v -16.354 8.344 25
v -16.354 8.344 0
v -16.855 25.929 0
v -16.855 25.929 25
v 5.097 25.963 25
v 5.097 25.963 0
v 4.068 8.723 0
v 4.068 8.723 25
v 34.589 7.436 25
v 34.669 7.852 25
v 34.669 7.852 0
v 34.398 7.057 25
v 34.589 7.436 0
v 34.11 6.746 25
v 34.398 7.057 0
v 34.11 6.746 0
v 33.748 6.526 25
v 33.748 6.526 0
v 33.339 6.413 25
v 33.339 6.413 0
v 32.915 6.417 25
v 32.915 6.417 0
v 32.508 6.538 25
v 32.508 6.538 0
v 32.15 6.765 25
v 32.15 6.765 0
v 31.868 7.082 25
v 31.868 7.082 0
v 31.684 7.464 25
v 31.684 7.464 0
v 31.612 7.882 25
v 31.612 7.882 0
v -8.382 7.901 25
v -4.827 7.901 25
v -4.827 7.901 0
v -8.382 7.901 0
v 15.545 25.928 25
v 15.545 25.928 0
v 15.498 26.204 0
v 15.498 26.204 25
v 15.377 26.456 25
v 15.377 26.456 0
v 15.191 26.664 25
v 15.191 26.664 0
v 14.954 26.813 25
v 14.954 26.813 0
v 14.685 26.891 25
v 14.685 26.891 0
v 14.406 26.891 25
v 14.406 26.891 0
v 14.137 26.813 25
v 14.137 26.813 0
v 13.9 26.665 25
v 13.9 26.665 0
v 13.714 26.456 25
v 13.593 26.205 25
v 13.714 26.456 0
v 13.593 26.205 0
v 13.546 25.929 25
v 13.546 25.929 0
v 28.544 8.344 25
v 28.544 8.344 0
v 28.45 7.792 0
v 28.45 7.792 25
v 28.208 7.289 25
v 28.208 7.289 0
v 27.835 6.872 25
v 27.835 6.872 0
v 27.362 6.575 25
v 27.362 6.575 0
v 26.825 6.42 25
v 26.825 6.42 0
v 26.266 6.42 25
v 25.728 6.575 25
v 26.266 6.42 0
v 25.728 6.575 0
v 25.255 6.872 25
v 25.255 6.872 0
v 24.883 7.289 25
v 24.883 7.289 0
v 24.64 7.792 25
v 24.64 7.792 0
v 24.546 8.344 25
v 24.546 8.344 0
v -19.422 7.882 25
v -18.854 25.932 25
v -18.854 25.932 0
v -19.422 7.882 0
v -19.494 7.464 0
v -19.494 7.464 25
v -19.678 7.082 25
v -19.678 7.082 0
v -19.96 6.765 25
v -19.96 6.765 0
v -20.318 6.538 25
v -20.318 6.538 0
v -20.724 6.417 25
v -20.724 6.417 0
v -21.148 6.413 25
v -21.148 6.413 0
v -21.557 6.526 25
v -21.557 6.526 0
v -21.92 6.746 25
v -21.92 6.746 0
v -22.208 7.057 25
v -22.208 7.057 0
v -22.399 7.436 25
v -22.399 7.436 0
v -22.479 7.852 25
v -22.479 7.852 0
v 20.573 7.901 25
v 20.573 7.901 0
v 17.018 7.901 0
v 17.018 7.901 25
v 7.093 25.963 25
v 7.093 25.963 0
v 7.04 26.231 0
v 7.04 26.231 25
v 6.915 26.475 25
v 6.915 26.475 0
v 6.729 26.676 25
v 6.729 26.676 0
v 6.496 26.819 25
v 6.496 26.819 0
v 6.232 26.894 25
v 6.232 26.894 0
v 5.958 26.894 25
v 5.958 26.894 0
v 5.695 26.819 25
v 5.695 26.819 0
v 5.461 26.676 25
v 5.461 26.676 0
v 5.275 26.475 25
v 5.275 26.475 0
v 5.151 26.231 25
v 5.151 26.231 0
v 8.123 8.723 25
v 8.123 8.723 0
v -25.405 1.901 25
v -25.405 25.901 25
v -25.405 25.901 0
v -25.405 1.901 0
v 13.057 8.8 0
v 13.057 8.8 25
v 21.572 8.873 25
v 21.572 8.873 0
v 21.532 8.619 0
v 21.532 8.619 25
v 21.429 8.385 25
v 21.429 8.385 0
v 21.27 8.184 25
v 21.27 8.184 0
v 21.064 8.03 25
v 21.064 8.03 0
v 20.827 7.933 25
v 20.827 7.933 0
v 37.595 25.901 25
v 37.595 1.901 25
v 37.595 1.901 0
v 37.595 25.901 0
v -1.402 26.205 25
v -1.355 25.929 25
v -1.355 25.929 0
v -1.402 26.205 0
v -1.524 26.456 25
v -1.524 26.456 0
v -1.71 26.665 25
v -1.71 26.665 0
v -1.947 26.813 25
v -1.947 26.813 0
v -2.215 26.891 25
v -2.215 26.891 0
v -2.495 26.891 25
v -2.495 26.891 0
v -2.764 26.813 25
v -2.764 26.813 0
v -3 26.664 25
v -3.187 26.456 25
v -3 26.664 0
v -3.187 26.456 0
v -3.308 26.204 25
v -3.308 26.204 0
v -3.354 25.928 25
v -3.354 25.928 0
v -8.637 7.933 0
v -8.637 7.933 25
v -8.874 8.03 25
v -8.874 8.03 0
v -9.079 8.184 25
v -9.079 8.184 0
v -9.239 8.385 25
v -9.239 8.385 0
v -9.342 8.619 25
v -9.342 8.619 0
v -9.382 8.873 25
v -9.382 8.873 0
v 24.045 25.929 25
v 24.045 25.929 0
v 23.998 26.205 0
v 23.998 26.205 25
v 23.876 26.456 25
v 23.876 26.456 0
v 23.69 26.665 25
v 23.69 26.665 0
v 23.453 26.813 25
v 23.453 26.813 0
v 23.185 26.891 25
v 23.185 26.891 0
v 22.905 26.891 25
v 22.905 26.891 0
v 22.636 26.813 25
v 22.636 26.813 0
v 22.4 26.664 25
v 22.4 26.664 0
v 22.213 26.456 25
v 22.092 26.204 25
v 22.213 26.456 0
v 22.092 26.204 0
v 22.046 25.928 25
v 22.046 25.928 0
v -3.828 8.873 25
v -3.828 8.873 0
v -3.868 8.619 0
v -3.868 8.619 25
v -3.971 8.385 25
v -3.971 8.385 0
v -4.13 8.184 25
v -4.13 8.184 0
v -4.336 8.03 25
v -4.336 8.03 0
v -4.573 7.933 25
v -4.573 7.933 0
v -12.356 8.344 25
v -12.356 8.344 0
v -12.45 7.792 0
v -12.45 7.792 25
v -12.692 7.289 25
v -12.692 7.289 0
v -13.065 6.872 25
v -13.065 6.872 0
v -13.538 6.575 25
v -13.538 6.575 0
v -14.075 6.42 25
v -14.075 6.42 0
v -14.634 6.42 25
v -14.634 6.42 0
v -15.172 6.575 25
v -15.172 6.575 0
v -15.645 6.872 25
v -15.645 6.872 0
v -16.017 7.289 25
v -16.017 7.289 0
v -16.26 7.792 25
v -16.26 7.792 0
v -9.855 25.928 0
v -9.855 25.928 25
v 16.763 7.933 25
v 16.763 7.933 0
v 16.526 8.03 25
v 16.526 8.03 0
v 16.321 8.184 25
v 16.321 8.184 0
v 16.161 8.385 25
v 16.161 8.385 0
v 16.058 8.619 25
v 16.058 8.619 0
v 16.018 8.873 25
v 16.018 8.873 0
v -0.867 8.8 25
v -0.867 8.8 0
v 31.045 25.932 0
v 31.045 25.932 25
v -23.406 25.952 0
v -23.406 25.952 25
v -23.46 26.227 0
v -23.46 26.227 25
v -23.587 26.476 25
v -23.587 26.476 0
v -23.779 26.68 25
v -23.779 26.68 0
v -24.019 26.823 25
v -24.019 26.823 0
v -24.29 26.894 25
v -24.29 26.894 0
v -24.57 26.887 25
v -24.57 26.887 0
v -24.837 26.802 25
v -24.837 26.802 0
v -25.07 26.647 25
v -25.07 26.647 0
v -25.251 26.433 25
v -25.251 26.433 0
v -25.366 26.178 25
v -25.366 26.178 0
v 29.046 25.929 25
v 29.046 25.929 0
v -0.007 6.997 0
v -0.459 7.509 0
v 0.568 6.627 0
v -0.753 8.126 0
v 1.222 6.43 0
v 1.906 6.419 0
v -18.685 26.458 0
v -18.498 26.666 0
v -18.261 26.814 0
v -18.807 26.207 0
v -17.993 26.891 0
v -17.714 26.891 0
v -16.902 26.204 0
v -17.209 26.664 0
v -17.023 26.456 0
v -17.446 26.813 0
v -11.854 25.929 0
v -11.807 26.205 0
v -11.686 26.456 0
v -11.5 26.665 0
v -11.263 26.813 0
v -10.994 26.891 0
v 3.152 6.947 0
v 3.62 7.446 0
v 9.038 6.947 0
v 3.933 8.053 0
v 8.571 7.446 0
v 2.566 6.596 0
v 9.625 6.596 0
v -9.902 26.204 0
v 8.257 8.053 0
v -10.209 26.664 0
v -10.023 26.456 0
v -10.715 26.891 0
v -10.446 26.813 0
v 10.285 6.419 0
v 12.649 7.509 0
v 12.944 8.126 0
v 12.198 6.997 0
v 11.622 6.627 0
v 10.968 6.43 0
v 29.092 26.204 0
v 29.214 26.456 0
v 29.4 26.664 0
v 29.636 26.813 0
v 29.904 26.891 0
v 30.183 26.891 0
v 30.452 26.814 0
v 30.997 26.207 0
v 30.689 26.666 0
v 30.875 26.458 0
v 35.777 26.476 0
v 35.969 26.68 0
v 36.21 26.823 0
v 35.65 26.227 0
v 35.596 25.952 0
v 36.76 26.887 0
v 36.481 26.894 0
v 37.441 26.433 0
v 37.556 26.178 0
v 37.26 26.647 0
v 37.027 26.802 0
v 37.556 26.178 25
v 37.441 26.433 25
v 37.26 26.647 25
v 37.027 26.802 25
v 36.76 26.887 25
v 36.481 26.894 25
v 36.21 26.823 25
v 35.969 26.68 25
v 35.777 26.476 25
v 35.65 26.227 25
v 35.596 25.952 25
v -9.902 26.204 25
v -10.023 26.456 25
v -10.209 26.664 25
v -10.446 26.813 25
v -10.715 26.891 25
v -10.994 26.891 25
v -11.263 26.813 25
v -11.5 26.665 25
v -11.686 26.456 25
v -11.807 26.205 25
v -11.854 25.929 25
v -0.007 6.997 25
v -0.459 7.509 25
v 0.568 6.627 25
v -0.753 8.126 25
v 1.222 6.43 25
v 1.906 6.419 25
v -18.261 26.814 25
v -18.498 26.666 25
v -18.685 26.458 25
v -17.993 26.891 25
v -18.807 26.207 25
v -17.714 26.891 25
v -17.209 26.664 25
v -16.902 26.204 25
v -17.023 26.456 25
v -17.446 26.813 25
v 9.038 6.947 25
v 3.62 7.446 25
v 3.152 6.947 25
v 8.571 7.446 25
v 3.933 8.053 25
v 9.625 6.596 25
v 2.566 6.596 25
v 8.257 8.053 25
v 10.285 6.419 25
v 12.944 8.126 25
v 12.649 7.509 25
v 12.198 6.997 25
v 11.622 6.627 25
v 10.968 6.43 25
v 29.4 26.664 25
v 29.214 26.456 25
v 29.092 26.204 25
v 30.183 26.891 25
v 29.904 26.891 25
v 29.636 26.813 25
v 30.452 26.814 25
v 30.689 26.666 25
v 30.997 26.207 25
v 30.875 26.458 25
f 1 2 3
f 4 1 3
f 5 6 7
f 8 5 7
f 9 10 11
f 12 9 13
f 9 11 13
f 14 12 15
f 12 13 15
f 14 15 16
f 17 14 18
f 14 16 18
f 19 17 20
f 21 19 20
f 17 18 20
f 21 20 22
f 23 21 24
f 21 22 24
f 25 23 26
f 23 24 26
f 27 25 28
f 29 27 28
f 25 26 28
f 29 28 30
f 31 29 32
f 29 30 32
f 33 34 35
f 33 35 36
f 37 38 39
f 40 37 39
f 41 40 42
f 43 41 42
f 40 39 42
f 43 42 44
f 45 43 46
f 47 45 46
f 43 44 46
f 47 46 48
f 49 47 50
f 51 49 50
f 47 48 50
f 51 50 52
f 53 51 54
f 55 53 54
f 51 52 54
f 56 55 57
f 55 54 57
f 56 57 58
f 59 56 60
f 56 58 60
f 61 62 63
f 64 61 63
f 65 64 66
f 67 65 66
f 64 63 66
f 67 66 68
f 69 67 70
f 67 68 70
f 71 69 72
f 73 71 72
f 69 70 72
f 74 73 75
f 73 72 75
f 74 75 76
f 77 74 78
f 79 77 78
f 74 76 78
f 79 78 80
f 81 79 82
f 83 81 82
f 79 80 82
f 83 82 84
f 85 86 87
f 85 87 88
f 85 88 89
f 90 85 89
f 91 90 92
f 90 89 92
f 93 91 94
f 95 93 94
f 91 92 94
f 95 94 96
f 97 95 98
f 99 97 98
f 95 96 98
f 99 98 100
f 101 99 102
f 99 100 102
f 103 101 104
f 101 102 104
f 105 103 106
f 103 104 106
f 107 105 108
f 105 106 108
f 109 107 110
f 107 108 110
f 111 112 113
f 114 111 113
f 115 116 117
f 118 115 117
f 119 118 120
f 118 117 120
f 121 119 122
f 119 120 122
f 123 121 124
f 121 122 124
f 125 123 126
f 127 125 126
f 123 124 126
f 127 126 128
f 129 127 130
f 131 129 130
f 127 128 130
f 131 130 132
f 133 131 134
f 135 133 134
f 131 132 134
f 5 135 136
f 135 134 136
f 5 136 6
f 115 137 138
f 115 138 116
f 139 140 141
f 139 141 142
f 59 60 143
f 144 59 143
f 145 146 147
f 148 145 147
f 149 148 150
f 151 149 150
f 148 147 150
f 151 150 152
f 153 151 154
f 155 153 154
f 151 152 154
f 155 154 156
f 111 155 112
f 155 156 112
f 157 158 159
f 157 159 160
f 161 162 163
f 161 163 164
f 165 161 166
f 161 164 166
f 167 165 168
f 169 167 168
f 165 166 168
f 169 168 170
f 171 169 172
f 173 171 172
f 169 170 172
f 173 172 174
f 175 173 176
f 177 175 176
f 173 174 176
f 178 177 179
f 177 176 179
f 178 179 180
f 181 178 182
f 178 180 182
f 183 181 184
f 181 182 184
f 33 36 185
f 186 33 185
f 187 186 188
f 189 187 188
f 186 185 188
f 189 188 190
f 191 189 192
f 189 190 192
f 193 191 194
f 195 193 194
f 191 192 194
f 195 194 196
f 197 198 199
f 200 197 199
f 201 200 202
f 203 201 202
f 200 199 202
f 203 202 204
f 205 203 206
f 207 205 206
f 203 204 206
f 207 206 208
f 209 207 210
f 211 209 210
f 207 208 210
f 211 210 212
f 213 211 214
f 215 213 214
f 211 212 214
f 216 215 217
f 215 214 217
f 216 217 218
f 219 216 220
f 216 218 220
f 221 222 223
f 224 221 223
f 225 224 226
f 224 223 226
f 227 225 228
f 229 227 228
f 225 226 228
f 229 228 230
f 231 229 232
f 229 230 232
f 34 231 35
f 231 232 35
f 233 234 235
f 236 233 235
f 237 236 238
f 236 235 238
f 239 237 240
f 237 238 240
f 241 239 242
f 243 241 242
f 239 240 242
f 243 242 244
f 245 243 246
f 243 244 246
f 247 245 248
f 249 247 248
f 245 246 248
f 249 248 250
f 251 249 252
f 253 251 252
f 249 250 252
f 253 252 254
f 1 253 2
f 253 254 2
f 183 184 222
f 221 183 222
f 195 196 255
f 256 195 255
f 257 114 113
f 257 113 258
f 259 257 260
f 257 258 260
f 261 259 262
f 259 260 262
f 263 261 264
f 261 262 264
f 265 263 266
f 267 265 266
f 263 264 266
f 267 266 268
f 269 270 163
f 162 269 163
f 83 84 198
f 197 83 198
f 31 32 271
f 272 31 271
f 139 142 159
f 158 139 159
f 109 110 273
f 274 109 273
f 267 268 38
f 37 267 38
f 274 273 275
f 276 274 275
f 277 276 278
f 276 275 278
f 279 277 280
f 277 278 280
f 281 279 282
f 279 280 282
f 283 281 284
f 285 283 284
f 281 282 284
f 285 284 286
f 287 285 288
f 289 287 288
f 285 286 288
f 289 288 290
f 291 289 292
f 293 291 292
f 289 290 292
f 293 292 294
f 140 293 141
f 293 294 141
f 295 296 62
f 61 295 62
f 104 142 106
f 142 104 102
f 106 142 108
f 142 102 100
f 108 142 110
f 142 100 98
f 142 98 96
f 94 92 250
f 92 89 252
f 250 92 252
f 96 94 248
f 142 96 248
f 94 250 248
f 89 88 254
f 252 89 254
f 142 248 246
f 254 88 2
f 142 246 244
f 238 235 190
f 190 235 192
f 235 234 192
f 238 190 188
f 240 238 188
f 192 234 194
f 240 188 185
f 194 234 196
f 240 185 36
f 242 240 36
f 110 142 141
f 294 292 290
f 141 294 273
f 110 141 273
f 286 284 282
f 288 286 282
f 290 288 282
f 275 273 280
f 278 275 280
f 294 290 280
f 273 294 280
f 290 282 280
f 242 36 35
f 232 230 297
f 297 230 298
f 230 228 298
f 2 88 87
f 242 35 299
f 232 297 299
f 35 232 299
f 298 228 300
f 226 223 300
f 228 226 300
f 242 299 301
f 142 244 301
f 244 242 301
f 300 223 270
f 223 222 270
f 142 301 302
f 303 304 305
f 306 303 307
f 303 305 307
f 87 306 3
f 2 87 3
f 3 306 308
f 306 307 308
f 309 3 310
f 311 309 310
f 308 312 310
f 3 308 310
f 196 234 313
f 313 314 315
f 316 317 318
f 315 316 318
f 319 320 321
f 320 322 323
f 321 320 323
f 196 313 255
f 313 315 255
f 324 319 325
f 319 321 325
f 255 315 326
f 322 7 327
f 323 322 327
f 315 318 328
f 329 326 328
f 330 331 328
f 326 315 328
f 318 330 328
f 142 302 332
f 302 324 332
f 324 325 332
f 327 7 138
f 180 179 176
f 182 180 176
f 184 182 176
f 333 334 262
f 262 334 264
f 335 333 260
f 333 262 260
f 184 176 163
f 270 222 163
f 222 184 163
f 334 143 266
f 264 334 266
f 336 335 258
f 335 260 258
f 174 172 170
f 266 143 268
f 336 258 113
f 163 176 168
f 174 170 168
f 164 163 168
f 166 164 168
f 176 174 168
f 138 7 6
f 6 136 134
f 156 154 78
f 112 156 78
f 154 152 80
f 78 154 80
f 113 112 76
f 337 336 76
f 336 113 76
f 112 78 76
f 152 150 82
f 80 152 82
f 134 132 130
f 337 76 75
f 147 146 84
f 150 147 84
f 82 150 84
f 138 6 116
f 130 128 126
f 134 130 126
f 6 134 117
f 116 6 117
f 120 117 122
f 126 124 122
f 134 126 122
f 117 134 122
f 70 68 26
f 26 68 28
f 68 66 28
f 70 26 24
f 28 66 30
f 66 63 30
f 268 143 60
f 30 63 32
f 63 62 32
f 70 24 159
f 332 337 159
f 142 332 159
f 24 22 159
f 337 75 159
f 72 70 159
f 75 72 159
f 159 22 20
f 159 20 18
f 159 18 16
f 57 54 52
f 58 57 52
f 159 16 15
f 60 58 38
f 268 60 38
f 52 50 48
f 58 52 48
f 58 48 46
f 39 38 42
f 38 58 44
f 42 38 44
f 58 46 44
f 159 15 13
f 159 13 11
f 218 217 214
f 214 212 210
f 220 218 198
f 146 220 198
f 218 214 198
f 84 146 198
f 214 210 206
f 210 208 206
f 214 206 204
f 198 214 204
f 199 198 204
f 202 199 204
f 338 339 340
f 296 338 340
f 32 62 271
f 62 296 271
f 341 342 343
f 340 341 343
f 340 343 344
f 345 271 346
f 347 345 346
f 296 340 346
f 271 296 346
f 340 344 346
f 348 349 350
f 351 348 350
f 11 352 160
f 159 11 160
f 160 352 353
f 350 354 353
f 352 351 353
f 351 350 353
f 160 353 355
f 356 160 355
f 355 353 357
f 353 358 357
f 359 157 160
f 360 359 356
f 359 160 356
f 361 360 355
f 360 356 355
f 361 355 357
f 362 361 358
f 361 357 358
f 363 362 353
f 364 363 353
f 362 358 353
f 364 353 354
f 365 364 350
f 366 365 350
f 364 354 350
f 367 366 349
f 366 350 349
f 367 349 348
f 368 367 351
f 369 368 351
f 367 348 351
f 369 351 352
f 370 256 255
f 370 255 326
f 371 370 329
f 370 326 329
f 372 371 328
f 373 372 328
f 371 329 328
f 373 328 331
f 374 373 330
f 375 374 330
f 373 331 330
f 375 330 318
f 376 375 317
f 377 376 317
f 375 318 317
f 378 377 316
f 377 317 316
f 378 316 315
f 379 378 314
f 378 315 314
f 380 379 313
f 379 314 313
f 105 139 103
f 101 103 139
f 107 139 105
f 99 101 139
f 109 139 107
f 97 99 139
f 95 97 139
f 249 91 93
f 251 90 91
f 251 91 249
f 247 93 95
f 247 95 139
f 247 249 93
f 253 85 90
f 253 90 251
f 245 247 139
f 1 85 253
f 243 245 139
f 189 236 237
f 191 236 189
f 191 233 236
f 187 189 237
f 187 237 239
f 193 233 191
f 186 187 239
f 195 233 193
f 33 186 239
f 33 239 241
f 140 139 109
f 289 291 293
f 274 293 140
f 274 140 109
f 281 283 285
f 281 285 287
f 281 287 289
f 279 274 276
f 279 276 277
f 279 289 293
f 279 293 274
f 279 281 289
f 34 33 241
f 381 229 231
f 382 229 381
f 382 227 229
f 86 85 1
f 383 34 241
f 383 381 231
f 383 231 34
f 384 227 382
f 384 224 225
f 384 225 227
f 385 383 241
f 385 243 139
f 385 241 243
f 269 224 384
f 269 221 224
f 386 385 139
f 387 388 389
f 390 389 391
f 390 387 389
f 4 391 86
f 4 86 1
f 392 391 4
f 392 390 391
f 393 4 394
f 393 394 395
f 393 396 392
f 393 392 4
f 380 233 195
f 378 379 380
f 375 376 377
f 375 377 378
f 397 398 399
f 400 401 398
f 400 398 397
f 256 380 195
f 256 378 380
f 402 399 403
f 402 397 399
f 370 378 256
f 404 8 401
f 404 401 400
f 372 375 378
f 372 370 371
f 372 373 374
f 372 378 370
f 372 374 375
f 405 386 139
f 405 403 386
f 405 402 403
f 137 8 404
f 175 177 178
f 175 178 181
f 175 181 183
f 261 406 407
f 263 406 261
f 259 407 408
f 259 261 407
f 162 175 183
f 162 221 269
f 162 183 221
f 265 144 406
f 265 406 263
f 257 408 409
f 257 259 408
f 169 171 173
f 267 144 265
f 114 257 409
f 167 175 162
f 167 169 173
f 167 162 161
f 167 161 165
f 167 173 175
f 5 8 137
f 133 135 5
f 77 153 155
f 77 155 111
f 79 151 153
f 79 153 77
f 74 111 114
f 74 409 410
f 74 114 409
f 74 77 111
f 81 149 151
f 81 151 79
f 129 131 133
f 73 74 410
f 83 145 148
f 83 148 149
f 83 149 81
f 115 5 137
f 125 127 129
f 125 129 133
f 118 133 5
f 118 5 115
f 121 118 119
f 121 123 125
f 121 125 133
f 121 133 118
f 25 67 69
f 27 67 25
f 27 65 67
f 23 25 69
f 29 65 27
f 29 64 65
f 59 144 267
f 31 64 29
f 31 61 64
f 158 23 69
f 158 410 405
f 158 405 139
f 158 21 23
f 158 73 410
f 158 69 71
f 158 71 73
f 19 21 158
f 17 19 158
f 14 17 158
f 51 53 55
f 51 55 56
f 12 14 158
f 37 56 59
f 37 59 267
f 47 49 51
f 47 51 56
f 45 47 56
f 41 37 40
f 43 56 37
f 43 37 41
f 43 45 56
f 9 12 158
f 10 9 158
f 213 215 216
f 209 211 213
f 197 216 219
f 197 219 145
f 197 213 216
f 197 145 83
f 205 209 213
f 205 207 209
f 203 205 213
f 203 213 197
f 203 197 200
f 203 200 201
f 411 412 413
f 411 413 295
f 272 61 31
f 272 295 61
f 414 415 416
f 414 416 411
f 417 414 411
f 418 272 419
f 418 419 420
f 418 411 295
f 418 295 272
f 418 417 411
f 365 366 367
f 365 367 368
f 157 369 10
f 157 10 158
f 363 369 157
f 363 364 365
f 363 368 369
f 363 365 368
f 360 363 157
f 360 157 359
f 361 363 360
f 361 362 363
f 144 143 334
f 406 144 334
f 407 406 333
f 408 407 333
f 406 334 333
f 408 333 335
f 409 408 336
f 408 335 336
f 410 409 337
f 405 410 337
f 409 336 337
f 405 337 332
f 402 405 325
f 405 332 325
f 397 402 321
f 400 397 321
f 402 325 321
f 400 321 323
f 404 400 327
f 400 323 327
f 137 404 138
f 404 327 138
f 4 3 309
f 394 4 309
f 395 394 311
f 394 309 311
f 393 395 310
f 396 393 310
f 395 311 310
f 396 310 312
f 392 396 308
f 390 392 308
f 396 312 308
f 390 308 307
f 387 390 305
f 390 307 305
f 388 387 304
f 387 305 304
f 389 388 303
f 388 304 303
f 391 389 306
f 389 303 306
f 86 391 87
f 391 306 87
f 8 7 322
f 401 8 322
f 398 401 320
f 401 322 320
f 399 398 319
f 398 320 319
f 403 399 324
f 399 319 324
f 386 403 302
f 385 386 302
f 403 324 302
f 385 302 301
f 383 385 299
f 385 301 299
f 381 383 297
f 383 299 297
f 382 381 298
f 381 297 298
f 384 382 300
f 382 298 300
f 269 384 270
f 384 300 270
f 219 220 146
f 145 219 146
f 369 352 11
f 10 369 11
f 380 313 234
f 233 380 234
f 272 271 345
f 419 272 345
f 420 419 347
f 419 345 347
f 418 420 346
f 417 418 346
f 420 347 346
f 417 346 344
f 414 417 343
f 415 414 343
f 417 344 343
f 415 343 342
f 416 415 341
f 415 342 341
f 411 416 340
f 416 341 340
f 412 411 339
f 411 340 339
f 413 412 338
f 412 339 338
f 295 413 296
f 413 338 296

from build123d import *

# Parameters (mm, degrees)
BOSS_EXTRU_1_DEPTH = 25


with BuildPart() as part:
    # Esquisse1 → Boss.-Extru.1 (new body)
    with BuildSketch(Plane.XY):
        with BuildLine():
            Line((20.572515541, 7.900512418), (17.017773047, 7.900512418))
            ThreePointArc((17.017773047, 7.900512418), (16.320544854, 8.183663168), (16.018158033, 8.872766723))
            Line((16.018158033, 8.872766723), (15.544759308, 25.928258114))
            ThreePointArc((15.544759308, 25.928258114), (14.545516715, 26.900512349), (13.545550223, 25.929002661))
            Line((13.545550223, 25.929002661), (13.057346636, 8.800141519))
            ThreePointArc((13.057346636, 8.800141519), (10.626813081, 6.400811923), (8.122740807, 8.723288601))
            Line((8.122740807, 8.723288601), (7.093366706, 25.96257467))
            ThreePointArc((7.093366706, 25.96257467), (6.095144481, 26.90297005), (5.096922241, 25.962574687))
            Line((5.096922241, 25.962574687), (4.067547777, 8.723288571))
            ThreePointArc((4.067547777, 8.723288571), (1.563475481, 6.400811945), (-0.867058048, 8.80014154))
            Line((-0.867058048, 8.80014154), (-1.355261635, 25.929002682))
            ThreePointArc((-1.355261635, 25.929002682), (-2.355228127, 26.90051237), (-3.35447072, 25.928258135))
            Line((-3.35447072, 25.928258135), (-3.827869445, 8.872766744))
            ThreePointArc((-3.827869445, 8.872766744), (-4.130256266, 8.183663189), (-4.827484459, 7.90051244))
            Line((-4.827484459, 7.90051244), (-8.382226953, 7.90051244))
            ThreePointArc((-8.382226953, 7.90051244), (-9.079455146, 8.183663189), (-9.381841967, 8.872766744))
            Line((-9.381841967, 8.872766744), (-9.855240692, 25.928258135))
            ThreePointArc((-9.855240692, 25.928258135), (-10.854483285, 26.90051237), (-11.854449777, 25.929002682))
            Line((-11.854449777, 25.929002682), (-12.355667565, 8.343531954))
            ThreePointArc((-12.355667565, 8.343531954), (-14.354855706, 6.40051244), (-16.354043847, 8.343531954))
            Line((-16.354043847, 8.343531954), (-16.855261635, 25.929002682))
            ThreePointArc((-16.855261635, 25.929002682), (-17.85338443, 26.900511357), (-18.854361615, 25.931943913))
            Line((-18.854361615, 25.931943913), (-19.42196512, 7.882422286))
            ThreePointArc((-19.42196512, 7.882422286), (-20.936113293, 6.400586914), (-22.479206535, 7.852256299))
            Line((-22.479206535, 7.852256299), (-23.406164612, 25.951660244))
            ThreePointArc((-23.406164612, 25.951660244), (-24.430437981, 26.90018516), (-25.404855706, 25.90051244))
            Line((-25.404855706, 25.90051244), (-25.404855706, 1.90051244))
            Line((-25.404855706, 1.90051244), (37.595144294, 1.90051244))
            Line((37.595144294, 1.90051244), (37.595144294, 25.900512418))
            ThreePointArc((37.595144294, 25.900512418), (36.620726569, 26.900185138), (35.5964532, 25.951660223))
            Line((35.5964532, 25.951660223), (34.669495123, 7.852256277))
            ThreePointArc((34.669495123, 7.852256277), (33.126401881, 6.400586892), (31.612253708, 7.882422264))
            Line((31.612253708, 7.882422264), (31.044650203, 25.931943892))
            ThreePointArc((31.044650203, 25.931943892), (30.043673018, 26.900511336), (29.045550223, 25.929002661))
            Line((29.045550223, 25.929002661), (28.544332435, 8.343531933))
            ThreePointArc((28.544332435, 8.343531933), (26.545144294, 6.400512418), (24.545956153, 8.343531933))
            Line((24.545956153, 8.343531933), (24.044738365, 25.929002661))
            ThreePointArc((24.044738365, 25.929002661), (23.044771873, 26.900512349), (22.04552928, 25.928258114))
            Line((22.04552928, 25.928258114), (21.572130555, 8.872766723))
            ThreePointArc((21.572130555, 8.872766723), (21.269743734, 8.183663168), (20.572515541, 7.900512418))
        make_face()
    extrude(amount=BOSS_EXTRU_1_DEPTH)


solid = part.part
